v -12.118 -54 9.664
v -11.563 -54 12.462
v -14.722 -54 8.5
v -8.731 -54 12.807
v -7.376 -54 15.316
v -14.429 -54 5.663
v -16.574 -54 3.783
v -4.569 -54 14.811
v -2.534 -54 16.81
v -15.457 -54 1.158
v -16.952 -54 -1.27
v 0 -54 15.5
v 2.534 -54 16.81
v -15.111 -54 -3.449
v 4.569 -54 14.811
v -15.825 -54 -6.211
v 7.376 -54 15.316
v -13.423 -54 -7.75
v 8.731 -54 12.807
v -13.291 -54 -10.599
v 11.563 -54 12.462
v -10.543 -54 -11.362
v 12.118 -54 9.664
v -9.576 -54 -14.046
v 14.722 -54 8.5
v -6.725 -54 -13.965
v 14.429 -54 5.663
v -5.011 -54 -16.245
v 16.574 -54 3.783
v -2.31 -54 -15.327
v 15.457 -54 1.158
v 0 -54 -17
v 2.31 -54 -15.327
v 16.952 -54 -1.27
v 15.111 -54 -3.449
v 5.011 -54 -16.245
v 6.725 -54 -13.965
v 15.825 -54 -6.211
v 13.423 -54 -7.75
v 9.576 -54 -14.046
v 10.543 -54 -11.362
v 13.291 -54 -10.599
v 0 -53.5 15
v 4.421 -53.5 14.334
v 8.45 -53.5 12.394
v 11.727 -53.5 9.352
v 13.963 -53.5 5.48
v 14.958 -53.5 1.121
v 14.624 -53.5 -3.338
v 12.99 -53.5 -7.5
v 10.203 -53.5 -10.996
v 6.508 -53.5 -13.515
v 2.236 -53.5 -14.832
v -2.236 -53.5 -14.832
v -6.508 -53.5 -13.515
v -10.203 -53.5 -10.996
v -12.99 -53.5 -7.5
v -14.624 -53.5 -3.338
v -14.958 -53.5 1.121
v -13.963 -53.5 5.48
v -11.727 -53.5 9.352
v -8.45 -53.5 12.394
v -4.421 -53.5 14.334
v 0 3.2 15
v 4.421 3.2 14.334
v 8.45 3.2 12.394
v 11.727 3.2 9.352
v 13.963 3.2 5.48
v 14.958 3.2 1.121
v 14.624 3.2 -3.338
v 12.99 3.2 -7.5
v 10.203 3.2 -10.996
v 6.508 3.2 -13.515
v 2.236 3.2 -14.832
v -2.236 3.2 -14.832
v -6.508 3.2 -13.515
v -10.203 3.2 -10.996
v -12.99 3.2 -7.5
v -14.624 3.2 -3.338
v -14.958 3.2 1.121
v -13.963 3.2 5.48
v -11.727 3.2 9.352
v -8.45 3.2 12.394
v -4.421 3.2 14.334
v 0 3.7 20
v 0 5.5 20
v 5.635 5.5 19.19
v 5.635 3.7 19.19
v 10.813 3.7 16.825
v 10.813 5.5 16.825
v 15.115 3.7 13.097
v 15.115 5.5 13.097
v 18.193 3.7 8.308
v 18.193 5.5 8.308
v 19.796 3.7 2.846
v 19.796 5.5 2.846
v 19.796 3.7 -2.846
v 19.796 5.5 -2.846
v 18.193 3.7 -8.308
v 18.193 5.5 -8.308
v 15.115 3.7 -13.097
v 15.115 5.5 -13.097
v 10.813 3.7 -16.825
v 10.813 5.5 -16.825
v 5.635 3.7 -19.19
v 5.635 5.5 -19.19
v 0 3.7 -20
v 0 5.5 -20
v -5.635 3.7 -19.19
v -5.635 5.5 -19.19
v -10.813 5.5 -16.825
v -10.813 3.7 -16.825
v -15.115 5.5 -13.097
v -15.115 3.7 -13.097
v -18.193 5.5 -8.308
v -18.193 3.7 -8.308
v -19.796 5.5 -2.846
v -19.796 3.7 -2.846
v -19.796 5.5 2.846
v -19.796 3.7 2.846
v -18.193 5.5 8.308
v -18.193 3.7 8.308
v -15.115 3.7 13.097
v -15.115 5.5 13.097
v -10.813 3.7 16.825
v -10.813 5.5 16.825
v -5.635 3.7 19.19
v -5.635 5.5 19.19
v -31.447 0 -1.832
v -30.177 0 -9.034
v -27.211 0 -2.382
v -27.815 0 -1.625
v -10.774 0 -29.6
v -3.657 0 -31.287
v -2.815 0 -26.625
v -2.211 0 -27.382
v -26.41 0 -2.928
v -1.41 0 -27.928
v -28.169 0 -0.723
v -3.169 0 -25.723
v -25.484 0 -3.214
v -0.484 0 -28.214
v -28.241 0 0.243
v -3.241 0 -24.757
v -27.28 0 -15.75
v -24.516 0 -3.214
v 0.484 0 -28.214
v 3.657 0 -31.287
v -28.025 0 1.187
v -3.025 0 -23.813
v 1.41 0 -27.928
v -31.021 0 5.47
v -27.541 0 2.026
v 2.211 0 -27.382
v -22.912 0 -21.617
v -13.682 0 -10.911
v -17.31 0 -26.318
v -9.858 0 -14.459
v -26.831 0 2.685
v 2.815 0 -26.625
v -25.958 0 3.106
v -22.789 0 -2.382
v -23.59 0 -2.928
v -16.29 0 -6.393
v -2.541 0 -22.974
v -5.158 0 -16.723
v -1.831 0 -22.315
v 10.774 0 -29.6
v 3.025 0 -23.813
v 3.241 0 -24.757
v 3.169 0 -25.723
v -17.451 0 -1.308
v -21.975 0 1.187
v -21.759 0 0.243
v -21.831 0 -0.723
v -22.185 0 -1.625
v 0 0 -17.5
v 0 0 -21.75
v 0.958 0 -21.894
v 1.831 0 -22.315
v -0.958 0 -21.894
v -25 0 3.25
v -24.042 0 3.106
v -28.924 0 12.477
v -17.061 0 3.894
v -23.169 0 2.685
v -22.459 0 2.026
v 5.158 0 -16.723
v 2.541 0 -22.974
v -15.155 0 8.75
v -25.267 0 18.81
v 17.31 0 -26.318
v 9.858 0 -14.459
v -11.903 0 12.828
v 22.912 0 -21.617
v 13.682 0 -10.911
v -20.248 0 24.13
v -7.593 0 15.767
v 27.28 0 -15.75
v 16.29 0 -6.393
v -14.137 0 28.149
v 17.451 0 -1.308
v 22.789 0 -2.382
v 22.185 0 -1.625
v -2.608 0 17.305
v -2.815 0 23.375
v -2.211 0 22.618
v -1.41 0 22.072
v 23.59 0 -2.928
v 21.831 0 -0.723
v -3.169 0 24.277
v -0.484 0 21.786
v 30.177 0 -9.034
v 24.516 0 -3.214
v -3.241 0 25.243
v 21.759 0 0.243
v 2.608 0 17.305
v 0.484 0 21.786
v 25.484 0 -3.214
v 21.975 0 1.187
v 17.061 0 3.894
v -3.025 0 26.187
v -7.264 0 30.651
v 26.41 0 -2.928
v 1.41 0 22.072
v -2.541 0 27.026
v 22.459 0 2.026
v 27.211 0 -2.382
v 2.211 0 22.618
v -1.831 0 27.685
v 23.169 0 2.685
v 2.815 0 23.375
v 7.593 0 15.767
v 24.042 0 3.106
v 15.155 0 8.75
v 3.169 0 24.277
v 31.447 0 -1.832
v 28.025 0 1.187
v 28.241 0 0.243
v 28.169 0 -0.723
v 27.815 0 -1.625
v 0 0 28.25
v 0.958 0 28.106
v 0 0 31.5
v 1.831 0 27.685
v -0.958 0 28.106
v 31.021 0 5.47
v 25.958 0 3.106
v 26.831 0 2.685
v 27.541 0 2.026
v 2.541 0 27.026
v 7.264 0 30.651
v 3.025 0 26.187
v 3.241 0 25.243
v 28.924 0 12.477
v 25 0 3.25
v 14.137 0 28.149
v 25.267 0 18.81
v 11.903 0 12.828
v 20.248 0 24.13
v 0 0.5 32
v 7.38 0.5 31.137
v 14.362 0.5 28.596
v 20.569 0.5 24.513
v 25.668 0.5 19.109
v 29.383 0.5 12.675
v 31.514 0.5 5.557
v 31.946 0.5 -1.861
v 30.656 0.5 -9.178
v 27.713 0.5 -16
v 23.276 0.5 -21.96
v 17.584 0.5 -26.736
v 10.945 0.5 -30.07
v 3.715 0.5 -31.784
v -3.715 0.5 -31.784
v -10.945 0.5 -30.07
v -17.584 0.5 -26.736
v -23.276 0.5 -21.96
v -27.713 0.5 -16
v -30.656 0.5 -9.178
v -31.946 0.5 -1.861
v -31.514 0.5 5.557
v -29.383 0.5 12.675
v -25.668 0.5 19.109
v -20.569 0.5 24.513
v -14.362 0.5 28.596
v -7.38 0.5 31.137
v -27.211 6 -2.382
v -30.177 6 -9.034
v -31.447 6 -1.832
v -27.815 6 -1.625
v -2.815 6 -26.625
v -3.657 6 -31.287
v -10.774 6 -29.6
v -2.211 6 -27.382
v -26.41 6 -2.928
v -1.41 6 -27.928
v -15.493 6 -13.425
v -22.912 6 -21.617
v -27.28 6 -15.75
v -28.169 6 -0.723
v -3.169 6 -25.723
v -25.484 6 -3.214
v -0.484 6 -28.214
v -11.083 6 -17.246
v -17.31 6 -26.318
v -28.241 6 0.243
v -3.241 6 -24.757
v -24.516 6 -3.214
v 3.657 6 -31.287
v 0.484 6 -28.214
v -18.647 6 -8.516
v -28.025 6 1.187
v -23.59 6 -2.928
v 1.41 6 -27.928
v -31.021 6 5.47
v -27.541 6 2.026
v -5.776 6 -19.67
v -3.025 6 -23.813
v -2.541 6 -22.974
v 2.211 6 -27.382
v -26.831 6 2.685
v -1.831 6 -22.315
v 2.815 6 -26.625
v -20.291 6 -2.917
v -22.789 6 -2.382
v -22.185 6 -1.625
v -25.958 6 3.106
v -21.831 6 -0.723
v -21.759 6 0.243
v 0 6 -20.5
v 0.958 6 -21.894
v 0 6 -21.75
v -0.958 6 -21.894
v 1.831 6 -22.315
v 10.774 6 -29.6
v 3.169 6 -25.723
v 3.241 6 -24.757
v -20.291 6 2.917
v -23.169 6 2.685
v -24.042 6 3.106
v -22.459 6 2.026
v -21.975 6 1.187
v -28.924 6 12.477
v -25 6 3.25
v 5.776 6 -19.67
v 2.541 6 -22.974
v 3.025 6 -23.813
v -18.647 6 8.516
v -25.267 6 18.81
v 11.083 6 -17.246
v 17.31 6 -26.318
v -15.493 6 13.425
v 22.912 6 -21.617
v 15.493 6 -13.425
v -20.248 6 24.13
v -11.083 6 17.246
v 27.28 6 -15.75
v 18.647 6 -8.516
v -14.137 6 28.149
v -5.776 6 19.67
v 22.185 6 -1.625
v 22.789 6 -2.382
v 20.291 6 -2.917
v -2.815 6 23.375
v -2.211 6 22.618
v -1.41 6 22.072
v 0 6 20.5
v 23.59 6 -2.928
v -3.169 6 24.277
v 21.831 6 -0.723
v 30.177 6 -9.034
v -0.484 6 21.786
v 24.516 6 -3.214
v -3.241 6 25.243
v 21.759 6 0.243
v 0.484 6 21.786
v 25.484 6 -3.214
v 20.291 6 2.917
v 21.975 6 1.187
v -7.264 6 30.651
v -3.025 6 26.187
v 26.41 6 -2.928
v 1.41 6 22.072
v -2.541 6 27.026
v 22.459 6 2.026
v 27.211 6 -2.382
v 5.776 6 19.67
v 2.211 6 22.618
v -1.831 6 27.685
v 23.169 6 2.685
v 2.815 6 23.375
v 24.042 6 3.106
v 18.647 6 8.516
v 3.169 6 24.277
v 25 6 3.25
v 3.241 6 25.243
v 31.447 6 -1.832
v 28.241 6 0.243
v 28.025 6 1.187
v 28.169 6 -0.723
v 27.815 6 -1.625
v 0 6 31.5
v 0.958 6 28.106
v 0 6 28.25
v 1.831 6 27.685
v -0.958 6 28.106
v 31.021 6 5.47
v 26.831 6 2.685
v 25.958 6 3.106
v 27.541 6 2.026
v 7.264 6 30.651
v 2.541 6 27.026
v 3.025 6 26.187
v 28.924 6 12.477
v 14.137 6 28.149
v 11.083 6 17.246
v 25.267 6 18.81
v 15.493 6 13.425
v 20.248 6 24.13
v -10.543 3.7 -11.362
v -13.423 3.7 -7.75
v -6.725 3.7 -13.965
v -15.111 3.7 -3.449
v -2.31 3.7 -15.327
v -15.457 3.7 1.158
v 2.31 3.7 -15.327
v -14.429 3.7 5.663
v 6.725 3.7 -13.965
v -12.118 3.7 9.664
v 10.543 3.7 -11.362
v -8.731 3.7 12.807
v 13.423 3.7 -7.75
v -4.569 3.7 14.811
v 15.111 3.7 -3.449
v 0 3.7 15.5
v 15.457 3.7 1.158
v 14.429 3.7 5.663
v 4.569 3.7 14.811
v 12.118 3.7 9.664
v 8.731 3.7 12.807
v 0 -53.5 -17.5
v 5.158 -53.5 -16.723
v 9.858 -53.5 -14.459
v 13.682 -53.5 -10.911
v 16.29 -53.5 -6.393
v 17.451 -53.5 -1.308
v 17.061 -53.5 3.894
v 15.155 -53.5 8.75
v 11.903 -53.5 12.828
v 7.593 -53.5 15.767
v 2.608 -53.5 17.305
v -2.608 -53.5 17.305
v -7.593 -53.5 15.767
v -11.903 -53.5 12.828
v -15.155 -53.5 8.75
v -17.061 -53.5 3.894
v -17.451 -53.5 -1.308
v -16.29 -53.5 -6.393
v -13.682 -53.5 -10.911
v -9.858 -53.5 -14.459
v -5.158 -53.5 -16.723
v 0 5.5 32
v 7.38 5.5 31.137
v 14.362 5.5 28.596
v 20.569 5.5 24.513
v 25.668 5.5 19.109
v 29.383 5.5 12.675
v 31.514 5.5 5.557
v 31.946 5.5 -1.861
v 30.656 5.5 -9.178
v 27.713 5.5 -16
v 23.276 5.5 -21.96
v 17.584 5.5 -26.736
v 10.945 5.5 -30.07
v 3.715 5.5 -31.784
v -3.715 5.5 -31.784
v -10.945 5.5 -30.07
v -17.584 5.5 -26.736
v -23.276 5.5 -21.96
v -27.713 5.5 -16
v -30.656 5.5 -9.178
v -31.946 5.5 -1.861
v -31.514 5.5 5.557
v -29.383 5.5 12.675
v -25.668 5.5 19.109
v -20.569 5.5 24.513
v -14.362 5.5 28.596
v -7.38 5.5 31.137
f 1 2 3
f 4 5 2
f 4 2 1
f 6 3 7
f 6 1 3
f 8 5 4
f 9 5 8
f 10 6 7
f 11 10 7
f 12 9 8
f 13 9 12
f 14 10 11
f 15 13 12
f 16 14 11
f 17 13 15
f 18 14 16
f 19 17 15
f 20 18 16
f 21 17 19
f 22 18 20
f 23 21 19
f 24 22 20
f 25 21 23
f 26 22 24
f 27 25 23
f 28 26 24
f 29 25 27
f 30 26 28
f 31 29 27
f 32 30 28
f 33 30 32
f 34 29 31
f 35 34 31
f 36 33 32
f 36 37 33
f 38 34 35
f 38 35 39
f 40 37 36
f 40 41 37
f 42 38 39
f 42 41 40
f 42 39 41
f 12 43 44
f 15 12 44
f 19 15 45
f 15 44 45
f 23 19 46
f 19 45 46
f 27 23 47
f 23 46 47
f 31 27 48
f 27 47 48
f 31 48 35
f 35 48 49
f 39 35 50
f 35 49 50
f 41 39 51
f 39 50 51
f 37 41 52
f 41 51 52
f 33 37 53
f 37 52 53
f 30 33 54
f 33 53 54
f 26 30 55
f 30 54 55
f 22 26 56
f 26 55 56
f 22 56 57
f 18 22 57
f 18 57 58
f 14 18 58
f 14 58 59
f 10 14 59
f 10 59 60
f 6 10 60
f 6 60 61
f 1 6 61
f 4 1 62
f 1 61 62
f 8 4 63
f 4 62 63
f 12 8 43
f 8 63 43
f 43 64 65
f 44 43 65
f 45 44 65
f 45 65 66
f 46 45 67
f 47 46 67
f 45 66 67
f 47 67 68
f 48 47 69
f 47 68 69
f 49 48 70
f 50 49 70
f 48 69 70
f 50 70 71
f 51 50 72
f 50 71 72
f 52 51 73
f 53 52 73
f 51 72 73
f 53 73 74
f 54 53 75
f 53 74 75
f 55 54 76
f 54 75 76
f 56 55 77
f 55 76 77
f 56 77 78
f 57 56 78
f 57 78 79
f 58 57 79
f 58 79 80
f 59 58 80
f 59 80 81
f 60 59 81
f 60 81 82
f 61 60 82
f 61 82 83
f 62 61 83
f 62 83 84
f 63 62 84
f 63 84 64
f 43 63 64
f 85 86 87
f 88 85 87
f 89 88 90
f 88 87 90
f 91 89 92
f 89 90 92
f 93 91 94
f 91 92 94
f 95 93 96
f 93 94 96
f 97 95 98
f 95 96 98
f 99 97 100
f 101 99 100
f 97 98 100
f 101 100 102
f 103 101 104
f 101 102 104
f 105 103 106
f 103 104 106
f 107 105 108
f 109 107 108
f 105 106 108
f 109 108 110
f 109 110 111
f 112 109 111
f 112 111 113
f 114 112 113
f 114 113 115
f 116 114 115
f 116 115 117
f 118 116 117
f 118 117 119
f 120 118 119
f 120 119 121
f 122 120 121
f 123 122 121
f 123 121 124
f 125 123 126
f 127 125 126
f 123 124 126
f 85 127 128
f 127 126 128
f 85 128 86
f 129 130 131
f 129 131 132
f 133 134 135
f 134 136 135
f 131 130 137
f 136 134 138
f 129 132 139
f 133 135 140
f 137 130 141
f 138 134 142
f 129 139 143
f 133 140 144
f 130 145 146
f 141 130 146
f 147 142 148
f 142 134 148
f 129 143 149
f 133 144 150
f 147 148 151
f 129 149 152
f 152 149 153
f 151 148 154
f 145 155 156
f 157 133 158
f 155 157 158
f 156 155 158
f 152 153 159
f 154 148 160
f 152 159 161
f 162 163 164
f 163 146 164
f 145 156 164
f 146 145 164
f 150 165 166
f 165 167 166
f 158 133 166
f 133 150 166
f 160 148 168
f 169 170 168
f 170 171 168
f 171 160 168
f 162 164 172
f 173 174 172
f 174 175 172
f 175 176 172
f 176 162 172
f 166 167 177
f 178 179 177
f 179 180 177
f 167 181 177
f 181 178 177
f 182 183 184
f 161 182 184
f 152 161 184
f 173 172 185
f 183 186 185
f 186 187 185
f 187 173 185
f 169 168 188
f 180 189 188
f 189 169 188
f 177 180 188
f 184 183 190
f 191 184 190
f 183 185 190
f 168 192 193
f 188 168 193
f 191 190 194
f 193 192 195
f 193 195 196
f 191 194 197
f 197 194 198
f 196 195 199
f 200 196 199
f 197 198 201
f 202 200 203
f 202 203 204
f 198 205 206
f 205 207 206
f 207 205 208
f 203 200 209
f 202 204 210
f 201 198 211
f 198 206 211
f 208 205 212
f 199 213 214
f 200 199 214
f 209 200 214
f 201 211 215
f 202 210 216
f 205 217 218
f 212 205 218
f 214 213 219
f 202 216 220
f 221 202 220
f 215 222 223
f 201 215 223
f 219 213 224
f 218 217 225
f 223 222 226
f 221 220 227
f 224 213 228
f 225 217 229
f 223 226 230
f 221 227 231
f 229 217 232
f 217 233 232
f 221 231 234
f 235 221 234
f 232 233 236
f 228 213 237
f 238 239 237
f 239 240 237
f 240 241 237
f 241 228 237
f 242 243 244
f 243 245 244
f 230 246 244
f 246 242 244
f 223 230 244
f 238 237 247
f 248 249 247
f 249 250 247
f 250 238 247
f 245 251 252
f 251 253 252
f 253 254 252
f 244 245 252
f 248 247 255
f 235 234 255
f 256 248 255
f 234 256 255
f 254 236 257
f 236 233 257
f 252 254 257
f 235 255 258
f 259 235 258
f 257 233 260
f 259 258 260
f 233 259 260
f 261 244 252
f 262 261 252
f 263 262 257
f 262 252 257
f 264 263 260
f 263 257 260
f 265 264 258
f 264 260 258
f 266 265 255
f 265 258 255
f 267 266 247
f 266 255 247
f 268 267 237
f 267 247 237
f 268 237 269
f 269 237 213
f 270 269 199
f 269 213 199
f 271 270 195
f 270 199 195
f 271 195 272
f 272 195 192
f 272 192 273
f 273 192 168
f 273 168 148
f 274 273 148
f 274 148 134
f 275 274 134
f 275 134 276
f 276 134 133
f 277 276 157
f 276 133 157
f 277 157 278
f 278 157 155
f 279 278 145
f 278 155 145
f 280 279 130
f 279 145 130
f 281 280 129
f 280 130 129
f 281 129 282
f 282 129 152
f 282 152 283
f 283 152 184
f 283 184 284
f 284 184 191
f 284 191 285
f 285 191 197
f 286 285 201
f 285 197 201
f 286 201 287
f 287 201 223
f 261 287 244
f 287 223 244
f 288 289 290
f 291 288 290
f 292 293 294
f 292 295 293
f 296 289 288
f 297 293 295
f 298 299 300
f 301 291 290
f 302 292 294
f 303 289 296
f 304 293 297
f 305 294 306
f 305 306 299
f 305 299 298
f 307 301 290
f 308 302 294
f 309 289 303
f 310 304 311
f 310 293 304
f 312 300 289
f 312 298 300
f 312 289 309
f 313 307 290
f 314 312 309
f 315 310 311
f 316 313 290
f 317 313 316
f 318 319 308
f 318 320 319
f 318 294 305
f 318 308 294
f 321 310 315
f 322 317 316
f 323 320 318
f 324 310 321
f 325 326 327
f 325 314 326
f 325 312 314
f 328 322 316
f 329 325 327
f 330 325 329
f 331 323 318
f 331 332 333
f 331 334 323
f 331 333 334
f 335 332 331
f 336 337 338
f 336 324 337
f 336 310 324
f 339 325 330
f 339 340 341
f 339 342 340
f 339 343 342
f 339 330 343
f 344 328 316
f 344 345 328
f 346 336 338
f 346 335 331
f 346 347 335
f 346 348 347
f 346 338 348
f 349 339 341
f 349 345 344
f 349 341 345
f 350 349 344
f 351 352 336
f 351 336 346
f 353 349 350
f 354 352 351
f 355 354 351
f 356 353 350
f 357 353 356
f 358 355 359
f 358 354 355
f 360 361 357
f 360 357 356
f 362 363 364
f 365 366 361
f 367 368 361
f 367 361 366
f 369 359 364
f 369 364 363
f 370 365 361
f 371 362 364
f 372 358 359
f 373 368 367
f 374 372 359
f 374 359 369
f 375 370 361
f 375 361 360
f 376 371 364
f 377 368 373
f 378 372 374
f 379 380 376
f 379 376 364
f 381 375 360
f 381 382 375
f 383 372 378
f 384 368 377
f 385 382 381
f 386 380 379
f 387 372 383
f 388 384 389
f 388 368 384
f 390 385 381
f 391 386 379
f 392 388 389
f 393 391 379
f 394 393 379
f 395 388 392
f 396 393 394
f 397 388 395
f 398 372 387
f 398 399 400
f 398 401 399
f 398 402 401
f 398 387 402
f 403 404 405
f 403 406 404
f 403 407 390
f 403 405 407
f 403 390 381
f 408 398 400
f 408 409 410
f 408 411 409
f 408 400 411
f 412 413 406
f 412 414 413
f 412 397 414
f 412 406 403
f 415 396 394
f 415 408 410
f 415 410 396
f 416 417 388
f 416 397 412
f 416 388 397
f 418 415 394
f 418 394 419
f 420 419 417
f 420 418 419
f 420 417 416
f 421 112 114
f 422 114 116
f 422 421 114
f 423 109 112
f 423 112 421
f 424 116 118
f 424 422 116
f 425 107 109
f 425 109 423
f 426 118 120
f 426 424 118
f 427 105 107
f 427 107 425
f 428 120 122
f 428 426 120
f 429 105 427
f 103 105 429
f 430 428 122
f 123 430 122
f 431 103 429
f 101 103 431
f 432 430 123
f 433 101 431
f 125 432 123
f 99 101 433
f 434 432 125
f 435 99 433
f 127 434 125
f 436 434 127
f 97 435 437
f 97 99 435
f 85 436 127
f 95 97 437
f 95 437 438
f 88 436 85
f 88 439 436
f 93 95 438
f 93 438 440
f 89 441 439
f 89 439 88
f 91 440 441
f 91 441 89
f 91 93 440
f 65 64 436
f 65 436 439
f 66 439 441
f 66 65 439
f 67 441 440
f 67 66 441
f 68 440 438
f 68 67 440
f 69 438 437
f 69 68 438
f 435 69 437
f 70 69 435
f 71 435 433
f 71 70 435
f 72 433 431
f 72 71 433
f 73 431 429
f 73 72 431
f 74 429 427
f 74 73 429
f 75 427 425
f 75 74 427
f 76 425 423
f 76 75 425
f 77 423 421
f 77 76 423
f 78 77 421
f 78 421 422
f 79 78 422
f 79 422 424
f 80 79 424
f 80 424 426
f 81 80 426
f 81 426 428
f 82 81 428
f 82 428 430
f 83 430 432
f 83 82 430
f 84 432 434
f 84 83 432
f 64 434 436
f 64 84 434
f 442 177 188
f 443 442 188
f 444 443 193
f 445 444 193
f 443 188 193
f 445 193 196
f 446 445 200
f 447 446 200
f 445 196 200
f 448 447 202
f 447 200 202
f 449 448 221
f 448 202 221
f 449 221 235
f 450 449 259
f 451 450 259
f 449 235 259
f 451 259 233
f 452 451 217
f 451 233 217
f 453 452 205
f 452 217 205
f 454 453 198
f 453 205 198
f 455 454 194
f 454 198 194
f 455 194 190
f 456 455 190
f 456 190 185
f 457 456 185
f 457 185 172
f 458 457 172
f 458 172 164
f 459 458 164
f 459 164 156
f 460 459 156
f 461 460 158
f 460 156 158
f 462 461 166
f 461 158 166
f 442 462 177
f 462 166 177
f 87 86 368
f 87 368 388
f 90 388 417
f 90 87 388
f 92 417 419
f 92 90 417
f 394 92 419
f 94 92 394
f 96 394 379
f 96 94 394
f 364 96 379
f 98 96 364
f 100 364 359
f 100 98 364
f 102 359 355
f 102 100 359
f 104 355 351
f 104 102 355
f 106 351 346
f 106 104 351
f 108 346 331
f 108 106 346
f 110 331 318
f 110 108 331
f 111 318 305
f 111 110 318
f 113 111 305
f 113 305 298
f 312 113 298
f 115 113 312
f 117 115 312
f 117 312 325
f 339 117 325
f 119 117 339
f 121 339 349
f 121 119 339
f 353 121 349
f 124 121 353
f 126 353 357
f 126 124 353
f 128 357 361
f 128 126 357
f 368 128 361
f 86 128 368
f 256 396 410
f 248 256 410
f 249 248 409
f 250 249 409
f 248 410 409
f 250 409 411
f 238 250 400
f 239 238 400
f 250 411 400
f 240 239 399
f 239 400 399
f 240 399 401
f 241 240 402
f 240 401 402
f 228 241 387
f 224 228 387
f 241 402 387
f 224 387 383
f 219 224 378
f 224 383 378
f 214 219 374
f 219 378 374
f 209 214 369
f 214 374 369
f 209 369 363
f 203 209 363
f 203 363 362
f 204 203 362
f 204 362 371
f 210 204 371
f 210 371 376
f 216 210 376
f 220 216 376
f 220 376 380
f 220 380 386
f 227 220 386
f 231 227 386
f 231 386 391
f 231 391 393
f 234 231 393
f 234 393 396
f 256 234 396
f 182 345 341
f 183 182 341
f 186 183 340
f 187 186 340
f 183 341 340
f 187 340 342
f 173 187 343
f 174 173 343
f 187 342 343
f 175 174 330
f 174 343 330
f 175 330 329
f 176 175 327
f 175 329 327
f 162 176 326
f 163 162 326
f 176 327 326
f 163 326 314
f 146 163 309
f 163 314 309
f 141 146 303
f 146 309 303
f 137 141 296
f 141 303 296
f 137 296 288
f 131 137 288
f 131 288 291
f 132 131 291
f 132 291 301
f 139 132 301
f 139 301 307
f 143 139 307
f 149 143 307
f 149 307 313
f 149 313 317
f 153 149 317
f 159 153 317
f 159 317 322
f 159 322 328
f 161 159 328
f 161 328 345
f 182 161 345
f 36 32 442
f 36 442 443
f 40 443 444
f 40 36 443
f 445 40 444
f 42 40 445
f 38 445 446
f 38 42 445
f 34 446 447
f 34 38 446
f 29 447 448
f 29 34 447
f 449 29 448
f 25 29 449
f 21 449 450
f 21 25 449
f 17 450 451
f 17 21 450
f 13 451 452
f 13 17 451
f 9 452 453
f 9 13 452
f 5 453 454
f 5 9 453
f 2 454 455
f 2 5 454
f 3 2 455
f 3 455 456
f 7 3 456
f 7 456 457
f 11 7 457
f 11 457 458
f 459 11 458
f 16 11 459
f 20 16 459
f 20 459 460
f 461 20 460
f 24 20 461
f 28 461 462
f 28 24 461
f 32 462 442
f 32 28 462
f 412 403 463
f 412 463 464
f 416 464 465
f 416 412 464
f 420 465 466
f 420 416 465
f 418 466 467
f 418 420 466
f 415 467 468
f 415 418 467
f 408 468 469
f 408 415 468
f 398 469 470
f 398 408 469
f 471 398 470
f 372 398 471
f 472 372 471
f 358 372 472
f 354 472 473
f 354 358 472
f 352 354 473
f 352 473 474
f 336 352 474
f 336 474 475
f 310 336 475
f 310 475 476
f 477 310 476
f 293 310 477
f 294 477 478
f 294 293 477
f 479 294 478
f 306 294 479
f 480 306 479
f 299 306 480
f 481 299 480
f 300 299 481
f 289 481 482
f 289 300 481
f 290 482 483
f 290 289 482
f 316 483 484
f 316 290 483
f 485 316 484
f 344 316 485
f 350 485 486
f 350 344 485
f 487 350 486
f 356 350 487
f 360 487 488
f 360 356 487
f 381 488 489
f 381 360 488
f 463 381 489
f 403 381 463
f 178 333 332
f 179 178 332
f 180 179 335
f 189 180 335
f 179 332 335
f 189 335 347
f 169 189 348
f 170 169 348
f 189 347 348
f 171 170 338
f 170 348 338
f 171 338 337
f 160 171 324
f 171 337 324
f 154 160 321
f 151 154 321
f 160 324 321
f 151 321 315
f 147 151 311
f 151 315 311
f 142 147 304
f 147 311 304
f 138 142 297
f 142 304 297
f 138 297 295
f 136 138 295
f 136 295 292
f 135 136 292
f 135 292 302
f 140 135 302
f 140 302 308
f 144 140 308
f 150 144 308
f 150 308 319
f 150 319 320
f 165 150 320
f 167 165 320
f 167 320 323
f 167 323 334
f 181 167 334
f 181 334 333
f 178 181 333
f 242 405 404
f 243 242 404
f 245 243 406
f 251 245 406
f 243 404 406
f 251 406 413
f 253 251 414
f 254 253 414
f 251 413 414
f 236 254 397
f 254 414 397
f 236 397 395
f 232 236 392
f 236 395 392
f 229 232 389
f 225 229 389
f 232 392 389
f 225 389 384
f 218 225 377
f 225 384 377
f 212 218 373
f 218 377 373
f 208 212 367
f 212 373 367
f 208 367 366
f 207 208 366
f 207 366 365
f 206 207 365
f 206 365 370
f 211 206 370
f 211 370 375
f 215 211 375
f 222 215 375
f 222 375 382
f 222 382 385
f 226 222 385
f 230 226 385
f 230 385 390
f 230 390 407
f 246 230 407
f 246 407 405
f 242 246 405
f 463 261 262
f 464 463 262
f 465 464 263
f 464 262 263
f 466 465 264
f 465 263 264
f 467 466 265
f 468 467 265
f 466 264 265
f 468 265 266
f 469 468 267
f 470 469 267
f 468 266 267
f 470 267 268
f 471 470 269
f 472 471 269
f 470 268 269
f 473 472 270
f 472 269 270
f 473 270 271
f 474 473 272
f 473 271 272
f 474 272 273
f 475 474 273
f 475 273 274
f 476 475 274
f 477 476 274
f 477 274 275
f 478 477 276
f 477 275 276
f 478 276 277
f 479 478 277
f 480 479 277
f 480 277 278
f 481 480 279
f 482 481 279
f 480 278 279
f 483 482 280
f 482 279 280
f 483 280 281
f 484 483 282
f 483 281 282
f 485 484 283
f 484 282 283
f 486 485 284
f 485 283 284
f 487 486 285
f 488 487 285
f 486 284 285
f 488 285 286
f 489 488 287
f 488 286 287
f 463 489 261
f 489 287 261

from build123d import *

# Parameters (mm, degrees)
SKETCH1_R           = 32
BOSS_EXTRUDE1_DEPTH = 6
SKETCH2_R           = 17.5
BOSS_EXTRUDE2_DEPTH = 54
SKETCH3_R           = 20
CUT_EXTRUDE1_DEPTH  = 2.3
SKETCH4_R           = 15
CUT_EXTRUDE2_DEPTH  = 74.3300075
SKETCH5_R           = 3.25
CUT_EXTRUDE3_DEPTH  = 76.153176912
CHAMFER1_SIZE       = 0.5


with BuildPart() as part:
    # Sketch1 → Boss-Extrude1 (new body)
    with BuildSketch(Plane(origin=(0, 0, 0), x_dir=(1, 0, 0), z_dir=(0, 1, 0))):
        with Locations(Location((0, 0, 0), (0, 0, 270))):
            Circle(SKETCH1_R)
    extrude(amount=BOSS_EXTRUDE1_DEPTH)

    # Sketch2 → Boss-Extrude2 (add)
    with BuildSketch(Plane.XZ):
        with Locations(Location((0, 0, 0), (0, 0, 270))):
            Circle(SKETCH2_R)
    extrude(amount=BOSS_EXTRUDE2_DEPTH)

    # Sketch3 → Cut-Extrude1 (cut)
    with BuildSketch(Plane(origin=(0, 6, 0), x_dir=(1, 0, 0), z_dir=(0, 1, 0))):
        with Locations(Location((0, 0, 0), (0, 0, 270))):
            Circle(SKETCH3_R)
    extrude(amount=-CUT_EXTRUDE1_DEPTH, mode=Mode.SUBTRACT)

    # Sketch4 → Cut-Extrude2 (cut, through all)
    with BuildSketch(Plane(origin=(0, 3.7, 0), x_dir=(1, 0, 0), z_dir=(0, 1, 0))):
        with Locations(Location((0, 0, 0), (0, 0, 270))):
            Circle(SKETCH4_R)
    extrude(amount=-CUT_EXTRUDE2_DEPTH, mode=Mode.SUBTRACT)

    # Sketch5 → Cut-Extrude3 (cut, through all)
    with BuildSketch(Plane(origin=(0, 6, 0), x_dir=(1, 0, 0), z_dir=(0, 1, 0))):
        with Locations(Location((0, 25, 0), (0, 0, 270))):
            Circle(SKETCH5_R)
        with Locations(Location((25, 0, 0), (0, 0, 270))):
            Circle(SKETCH5_R)
        with Locations(Location((0, -25, 0), (0, 0, 270))):
            Circle(SKETCH5_R)
        with Locations(Location((-25, 0, 0), (0, 0, 270))):
            Circle(SKETCH5_R)
    extrude(amount=-CUT_EXTRUDE3_DEPTH, mode=Mode.SUBTRACT)

    # Chamfer1
    chamfer1_edges = [part.edges().sort_by_distance(p)[0] for p in [
        (0, 6, -20),
        (0, -54, -15),
        (0, 3.7, -15),
        (0, 0, -32),
        (0, 6, -32),
        (0, -54, 17.5),
    ]]
    chamfer(chamfer1_edges, length=CHAMFER1_SIZE)


solid = part.part
